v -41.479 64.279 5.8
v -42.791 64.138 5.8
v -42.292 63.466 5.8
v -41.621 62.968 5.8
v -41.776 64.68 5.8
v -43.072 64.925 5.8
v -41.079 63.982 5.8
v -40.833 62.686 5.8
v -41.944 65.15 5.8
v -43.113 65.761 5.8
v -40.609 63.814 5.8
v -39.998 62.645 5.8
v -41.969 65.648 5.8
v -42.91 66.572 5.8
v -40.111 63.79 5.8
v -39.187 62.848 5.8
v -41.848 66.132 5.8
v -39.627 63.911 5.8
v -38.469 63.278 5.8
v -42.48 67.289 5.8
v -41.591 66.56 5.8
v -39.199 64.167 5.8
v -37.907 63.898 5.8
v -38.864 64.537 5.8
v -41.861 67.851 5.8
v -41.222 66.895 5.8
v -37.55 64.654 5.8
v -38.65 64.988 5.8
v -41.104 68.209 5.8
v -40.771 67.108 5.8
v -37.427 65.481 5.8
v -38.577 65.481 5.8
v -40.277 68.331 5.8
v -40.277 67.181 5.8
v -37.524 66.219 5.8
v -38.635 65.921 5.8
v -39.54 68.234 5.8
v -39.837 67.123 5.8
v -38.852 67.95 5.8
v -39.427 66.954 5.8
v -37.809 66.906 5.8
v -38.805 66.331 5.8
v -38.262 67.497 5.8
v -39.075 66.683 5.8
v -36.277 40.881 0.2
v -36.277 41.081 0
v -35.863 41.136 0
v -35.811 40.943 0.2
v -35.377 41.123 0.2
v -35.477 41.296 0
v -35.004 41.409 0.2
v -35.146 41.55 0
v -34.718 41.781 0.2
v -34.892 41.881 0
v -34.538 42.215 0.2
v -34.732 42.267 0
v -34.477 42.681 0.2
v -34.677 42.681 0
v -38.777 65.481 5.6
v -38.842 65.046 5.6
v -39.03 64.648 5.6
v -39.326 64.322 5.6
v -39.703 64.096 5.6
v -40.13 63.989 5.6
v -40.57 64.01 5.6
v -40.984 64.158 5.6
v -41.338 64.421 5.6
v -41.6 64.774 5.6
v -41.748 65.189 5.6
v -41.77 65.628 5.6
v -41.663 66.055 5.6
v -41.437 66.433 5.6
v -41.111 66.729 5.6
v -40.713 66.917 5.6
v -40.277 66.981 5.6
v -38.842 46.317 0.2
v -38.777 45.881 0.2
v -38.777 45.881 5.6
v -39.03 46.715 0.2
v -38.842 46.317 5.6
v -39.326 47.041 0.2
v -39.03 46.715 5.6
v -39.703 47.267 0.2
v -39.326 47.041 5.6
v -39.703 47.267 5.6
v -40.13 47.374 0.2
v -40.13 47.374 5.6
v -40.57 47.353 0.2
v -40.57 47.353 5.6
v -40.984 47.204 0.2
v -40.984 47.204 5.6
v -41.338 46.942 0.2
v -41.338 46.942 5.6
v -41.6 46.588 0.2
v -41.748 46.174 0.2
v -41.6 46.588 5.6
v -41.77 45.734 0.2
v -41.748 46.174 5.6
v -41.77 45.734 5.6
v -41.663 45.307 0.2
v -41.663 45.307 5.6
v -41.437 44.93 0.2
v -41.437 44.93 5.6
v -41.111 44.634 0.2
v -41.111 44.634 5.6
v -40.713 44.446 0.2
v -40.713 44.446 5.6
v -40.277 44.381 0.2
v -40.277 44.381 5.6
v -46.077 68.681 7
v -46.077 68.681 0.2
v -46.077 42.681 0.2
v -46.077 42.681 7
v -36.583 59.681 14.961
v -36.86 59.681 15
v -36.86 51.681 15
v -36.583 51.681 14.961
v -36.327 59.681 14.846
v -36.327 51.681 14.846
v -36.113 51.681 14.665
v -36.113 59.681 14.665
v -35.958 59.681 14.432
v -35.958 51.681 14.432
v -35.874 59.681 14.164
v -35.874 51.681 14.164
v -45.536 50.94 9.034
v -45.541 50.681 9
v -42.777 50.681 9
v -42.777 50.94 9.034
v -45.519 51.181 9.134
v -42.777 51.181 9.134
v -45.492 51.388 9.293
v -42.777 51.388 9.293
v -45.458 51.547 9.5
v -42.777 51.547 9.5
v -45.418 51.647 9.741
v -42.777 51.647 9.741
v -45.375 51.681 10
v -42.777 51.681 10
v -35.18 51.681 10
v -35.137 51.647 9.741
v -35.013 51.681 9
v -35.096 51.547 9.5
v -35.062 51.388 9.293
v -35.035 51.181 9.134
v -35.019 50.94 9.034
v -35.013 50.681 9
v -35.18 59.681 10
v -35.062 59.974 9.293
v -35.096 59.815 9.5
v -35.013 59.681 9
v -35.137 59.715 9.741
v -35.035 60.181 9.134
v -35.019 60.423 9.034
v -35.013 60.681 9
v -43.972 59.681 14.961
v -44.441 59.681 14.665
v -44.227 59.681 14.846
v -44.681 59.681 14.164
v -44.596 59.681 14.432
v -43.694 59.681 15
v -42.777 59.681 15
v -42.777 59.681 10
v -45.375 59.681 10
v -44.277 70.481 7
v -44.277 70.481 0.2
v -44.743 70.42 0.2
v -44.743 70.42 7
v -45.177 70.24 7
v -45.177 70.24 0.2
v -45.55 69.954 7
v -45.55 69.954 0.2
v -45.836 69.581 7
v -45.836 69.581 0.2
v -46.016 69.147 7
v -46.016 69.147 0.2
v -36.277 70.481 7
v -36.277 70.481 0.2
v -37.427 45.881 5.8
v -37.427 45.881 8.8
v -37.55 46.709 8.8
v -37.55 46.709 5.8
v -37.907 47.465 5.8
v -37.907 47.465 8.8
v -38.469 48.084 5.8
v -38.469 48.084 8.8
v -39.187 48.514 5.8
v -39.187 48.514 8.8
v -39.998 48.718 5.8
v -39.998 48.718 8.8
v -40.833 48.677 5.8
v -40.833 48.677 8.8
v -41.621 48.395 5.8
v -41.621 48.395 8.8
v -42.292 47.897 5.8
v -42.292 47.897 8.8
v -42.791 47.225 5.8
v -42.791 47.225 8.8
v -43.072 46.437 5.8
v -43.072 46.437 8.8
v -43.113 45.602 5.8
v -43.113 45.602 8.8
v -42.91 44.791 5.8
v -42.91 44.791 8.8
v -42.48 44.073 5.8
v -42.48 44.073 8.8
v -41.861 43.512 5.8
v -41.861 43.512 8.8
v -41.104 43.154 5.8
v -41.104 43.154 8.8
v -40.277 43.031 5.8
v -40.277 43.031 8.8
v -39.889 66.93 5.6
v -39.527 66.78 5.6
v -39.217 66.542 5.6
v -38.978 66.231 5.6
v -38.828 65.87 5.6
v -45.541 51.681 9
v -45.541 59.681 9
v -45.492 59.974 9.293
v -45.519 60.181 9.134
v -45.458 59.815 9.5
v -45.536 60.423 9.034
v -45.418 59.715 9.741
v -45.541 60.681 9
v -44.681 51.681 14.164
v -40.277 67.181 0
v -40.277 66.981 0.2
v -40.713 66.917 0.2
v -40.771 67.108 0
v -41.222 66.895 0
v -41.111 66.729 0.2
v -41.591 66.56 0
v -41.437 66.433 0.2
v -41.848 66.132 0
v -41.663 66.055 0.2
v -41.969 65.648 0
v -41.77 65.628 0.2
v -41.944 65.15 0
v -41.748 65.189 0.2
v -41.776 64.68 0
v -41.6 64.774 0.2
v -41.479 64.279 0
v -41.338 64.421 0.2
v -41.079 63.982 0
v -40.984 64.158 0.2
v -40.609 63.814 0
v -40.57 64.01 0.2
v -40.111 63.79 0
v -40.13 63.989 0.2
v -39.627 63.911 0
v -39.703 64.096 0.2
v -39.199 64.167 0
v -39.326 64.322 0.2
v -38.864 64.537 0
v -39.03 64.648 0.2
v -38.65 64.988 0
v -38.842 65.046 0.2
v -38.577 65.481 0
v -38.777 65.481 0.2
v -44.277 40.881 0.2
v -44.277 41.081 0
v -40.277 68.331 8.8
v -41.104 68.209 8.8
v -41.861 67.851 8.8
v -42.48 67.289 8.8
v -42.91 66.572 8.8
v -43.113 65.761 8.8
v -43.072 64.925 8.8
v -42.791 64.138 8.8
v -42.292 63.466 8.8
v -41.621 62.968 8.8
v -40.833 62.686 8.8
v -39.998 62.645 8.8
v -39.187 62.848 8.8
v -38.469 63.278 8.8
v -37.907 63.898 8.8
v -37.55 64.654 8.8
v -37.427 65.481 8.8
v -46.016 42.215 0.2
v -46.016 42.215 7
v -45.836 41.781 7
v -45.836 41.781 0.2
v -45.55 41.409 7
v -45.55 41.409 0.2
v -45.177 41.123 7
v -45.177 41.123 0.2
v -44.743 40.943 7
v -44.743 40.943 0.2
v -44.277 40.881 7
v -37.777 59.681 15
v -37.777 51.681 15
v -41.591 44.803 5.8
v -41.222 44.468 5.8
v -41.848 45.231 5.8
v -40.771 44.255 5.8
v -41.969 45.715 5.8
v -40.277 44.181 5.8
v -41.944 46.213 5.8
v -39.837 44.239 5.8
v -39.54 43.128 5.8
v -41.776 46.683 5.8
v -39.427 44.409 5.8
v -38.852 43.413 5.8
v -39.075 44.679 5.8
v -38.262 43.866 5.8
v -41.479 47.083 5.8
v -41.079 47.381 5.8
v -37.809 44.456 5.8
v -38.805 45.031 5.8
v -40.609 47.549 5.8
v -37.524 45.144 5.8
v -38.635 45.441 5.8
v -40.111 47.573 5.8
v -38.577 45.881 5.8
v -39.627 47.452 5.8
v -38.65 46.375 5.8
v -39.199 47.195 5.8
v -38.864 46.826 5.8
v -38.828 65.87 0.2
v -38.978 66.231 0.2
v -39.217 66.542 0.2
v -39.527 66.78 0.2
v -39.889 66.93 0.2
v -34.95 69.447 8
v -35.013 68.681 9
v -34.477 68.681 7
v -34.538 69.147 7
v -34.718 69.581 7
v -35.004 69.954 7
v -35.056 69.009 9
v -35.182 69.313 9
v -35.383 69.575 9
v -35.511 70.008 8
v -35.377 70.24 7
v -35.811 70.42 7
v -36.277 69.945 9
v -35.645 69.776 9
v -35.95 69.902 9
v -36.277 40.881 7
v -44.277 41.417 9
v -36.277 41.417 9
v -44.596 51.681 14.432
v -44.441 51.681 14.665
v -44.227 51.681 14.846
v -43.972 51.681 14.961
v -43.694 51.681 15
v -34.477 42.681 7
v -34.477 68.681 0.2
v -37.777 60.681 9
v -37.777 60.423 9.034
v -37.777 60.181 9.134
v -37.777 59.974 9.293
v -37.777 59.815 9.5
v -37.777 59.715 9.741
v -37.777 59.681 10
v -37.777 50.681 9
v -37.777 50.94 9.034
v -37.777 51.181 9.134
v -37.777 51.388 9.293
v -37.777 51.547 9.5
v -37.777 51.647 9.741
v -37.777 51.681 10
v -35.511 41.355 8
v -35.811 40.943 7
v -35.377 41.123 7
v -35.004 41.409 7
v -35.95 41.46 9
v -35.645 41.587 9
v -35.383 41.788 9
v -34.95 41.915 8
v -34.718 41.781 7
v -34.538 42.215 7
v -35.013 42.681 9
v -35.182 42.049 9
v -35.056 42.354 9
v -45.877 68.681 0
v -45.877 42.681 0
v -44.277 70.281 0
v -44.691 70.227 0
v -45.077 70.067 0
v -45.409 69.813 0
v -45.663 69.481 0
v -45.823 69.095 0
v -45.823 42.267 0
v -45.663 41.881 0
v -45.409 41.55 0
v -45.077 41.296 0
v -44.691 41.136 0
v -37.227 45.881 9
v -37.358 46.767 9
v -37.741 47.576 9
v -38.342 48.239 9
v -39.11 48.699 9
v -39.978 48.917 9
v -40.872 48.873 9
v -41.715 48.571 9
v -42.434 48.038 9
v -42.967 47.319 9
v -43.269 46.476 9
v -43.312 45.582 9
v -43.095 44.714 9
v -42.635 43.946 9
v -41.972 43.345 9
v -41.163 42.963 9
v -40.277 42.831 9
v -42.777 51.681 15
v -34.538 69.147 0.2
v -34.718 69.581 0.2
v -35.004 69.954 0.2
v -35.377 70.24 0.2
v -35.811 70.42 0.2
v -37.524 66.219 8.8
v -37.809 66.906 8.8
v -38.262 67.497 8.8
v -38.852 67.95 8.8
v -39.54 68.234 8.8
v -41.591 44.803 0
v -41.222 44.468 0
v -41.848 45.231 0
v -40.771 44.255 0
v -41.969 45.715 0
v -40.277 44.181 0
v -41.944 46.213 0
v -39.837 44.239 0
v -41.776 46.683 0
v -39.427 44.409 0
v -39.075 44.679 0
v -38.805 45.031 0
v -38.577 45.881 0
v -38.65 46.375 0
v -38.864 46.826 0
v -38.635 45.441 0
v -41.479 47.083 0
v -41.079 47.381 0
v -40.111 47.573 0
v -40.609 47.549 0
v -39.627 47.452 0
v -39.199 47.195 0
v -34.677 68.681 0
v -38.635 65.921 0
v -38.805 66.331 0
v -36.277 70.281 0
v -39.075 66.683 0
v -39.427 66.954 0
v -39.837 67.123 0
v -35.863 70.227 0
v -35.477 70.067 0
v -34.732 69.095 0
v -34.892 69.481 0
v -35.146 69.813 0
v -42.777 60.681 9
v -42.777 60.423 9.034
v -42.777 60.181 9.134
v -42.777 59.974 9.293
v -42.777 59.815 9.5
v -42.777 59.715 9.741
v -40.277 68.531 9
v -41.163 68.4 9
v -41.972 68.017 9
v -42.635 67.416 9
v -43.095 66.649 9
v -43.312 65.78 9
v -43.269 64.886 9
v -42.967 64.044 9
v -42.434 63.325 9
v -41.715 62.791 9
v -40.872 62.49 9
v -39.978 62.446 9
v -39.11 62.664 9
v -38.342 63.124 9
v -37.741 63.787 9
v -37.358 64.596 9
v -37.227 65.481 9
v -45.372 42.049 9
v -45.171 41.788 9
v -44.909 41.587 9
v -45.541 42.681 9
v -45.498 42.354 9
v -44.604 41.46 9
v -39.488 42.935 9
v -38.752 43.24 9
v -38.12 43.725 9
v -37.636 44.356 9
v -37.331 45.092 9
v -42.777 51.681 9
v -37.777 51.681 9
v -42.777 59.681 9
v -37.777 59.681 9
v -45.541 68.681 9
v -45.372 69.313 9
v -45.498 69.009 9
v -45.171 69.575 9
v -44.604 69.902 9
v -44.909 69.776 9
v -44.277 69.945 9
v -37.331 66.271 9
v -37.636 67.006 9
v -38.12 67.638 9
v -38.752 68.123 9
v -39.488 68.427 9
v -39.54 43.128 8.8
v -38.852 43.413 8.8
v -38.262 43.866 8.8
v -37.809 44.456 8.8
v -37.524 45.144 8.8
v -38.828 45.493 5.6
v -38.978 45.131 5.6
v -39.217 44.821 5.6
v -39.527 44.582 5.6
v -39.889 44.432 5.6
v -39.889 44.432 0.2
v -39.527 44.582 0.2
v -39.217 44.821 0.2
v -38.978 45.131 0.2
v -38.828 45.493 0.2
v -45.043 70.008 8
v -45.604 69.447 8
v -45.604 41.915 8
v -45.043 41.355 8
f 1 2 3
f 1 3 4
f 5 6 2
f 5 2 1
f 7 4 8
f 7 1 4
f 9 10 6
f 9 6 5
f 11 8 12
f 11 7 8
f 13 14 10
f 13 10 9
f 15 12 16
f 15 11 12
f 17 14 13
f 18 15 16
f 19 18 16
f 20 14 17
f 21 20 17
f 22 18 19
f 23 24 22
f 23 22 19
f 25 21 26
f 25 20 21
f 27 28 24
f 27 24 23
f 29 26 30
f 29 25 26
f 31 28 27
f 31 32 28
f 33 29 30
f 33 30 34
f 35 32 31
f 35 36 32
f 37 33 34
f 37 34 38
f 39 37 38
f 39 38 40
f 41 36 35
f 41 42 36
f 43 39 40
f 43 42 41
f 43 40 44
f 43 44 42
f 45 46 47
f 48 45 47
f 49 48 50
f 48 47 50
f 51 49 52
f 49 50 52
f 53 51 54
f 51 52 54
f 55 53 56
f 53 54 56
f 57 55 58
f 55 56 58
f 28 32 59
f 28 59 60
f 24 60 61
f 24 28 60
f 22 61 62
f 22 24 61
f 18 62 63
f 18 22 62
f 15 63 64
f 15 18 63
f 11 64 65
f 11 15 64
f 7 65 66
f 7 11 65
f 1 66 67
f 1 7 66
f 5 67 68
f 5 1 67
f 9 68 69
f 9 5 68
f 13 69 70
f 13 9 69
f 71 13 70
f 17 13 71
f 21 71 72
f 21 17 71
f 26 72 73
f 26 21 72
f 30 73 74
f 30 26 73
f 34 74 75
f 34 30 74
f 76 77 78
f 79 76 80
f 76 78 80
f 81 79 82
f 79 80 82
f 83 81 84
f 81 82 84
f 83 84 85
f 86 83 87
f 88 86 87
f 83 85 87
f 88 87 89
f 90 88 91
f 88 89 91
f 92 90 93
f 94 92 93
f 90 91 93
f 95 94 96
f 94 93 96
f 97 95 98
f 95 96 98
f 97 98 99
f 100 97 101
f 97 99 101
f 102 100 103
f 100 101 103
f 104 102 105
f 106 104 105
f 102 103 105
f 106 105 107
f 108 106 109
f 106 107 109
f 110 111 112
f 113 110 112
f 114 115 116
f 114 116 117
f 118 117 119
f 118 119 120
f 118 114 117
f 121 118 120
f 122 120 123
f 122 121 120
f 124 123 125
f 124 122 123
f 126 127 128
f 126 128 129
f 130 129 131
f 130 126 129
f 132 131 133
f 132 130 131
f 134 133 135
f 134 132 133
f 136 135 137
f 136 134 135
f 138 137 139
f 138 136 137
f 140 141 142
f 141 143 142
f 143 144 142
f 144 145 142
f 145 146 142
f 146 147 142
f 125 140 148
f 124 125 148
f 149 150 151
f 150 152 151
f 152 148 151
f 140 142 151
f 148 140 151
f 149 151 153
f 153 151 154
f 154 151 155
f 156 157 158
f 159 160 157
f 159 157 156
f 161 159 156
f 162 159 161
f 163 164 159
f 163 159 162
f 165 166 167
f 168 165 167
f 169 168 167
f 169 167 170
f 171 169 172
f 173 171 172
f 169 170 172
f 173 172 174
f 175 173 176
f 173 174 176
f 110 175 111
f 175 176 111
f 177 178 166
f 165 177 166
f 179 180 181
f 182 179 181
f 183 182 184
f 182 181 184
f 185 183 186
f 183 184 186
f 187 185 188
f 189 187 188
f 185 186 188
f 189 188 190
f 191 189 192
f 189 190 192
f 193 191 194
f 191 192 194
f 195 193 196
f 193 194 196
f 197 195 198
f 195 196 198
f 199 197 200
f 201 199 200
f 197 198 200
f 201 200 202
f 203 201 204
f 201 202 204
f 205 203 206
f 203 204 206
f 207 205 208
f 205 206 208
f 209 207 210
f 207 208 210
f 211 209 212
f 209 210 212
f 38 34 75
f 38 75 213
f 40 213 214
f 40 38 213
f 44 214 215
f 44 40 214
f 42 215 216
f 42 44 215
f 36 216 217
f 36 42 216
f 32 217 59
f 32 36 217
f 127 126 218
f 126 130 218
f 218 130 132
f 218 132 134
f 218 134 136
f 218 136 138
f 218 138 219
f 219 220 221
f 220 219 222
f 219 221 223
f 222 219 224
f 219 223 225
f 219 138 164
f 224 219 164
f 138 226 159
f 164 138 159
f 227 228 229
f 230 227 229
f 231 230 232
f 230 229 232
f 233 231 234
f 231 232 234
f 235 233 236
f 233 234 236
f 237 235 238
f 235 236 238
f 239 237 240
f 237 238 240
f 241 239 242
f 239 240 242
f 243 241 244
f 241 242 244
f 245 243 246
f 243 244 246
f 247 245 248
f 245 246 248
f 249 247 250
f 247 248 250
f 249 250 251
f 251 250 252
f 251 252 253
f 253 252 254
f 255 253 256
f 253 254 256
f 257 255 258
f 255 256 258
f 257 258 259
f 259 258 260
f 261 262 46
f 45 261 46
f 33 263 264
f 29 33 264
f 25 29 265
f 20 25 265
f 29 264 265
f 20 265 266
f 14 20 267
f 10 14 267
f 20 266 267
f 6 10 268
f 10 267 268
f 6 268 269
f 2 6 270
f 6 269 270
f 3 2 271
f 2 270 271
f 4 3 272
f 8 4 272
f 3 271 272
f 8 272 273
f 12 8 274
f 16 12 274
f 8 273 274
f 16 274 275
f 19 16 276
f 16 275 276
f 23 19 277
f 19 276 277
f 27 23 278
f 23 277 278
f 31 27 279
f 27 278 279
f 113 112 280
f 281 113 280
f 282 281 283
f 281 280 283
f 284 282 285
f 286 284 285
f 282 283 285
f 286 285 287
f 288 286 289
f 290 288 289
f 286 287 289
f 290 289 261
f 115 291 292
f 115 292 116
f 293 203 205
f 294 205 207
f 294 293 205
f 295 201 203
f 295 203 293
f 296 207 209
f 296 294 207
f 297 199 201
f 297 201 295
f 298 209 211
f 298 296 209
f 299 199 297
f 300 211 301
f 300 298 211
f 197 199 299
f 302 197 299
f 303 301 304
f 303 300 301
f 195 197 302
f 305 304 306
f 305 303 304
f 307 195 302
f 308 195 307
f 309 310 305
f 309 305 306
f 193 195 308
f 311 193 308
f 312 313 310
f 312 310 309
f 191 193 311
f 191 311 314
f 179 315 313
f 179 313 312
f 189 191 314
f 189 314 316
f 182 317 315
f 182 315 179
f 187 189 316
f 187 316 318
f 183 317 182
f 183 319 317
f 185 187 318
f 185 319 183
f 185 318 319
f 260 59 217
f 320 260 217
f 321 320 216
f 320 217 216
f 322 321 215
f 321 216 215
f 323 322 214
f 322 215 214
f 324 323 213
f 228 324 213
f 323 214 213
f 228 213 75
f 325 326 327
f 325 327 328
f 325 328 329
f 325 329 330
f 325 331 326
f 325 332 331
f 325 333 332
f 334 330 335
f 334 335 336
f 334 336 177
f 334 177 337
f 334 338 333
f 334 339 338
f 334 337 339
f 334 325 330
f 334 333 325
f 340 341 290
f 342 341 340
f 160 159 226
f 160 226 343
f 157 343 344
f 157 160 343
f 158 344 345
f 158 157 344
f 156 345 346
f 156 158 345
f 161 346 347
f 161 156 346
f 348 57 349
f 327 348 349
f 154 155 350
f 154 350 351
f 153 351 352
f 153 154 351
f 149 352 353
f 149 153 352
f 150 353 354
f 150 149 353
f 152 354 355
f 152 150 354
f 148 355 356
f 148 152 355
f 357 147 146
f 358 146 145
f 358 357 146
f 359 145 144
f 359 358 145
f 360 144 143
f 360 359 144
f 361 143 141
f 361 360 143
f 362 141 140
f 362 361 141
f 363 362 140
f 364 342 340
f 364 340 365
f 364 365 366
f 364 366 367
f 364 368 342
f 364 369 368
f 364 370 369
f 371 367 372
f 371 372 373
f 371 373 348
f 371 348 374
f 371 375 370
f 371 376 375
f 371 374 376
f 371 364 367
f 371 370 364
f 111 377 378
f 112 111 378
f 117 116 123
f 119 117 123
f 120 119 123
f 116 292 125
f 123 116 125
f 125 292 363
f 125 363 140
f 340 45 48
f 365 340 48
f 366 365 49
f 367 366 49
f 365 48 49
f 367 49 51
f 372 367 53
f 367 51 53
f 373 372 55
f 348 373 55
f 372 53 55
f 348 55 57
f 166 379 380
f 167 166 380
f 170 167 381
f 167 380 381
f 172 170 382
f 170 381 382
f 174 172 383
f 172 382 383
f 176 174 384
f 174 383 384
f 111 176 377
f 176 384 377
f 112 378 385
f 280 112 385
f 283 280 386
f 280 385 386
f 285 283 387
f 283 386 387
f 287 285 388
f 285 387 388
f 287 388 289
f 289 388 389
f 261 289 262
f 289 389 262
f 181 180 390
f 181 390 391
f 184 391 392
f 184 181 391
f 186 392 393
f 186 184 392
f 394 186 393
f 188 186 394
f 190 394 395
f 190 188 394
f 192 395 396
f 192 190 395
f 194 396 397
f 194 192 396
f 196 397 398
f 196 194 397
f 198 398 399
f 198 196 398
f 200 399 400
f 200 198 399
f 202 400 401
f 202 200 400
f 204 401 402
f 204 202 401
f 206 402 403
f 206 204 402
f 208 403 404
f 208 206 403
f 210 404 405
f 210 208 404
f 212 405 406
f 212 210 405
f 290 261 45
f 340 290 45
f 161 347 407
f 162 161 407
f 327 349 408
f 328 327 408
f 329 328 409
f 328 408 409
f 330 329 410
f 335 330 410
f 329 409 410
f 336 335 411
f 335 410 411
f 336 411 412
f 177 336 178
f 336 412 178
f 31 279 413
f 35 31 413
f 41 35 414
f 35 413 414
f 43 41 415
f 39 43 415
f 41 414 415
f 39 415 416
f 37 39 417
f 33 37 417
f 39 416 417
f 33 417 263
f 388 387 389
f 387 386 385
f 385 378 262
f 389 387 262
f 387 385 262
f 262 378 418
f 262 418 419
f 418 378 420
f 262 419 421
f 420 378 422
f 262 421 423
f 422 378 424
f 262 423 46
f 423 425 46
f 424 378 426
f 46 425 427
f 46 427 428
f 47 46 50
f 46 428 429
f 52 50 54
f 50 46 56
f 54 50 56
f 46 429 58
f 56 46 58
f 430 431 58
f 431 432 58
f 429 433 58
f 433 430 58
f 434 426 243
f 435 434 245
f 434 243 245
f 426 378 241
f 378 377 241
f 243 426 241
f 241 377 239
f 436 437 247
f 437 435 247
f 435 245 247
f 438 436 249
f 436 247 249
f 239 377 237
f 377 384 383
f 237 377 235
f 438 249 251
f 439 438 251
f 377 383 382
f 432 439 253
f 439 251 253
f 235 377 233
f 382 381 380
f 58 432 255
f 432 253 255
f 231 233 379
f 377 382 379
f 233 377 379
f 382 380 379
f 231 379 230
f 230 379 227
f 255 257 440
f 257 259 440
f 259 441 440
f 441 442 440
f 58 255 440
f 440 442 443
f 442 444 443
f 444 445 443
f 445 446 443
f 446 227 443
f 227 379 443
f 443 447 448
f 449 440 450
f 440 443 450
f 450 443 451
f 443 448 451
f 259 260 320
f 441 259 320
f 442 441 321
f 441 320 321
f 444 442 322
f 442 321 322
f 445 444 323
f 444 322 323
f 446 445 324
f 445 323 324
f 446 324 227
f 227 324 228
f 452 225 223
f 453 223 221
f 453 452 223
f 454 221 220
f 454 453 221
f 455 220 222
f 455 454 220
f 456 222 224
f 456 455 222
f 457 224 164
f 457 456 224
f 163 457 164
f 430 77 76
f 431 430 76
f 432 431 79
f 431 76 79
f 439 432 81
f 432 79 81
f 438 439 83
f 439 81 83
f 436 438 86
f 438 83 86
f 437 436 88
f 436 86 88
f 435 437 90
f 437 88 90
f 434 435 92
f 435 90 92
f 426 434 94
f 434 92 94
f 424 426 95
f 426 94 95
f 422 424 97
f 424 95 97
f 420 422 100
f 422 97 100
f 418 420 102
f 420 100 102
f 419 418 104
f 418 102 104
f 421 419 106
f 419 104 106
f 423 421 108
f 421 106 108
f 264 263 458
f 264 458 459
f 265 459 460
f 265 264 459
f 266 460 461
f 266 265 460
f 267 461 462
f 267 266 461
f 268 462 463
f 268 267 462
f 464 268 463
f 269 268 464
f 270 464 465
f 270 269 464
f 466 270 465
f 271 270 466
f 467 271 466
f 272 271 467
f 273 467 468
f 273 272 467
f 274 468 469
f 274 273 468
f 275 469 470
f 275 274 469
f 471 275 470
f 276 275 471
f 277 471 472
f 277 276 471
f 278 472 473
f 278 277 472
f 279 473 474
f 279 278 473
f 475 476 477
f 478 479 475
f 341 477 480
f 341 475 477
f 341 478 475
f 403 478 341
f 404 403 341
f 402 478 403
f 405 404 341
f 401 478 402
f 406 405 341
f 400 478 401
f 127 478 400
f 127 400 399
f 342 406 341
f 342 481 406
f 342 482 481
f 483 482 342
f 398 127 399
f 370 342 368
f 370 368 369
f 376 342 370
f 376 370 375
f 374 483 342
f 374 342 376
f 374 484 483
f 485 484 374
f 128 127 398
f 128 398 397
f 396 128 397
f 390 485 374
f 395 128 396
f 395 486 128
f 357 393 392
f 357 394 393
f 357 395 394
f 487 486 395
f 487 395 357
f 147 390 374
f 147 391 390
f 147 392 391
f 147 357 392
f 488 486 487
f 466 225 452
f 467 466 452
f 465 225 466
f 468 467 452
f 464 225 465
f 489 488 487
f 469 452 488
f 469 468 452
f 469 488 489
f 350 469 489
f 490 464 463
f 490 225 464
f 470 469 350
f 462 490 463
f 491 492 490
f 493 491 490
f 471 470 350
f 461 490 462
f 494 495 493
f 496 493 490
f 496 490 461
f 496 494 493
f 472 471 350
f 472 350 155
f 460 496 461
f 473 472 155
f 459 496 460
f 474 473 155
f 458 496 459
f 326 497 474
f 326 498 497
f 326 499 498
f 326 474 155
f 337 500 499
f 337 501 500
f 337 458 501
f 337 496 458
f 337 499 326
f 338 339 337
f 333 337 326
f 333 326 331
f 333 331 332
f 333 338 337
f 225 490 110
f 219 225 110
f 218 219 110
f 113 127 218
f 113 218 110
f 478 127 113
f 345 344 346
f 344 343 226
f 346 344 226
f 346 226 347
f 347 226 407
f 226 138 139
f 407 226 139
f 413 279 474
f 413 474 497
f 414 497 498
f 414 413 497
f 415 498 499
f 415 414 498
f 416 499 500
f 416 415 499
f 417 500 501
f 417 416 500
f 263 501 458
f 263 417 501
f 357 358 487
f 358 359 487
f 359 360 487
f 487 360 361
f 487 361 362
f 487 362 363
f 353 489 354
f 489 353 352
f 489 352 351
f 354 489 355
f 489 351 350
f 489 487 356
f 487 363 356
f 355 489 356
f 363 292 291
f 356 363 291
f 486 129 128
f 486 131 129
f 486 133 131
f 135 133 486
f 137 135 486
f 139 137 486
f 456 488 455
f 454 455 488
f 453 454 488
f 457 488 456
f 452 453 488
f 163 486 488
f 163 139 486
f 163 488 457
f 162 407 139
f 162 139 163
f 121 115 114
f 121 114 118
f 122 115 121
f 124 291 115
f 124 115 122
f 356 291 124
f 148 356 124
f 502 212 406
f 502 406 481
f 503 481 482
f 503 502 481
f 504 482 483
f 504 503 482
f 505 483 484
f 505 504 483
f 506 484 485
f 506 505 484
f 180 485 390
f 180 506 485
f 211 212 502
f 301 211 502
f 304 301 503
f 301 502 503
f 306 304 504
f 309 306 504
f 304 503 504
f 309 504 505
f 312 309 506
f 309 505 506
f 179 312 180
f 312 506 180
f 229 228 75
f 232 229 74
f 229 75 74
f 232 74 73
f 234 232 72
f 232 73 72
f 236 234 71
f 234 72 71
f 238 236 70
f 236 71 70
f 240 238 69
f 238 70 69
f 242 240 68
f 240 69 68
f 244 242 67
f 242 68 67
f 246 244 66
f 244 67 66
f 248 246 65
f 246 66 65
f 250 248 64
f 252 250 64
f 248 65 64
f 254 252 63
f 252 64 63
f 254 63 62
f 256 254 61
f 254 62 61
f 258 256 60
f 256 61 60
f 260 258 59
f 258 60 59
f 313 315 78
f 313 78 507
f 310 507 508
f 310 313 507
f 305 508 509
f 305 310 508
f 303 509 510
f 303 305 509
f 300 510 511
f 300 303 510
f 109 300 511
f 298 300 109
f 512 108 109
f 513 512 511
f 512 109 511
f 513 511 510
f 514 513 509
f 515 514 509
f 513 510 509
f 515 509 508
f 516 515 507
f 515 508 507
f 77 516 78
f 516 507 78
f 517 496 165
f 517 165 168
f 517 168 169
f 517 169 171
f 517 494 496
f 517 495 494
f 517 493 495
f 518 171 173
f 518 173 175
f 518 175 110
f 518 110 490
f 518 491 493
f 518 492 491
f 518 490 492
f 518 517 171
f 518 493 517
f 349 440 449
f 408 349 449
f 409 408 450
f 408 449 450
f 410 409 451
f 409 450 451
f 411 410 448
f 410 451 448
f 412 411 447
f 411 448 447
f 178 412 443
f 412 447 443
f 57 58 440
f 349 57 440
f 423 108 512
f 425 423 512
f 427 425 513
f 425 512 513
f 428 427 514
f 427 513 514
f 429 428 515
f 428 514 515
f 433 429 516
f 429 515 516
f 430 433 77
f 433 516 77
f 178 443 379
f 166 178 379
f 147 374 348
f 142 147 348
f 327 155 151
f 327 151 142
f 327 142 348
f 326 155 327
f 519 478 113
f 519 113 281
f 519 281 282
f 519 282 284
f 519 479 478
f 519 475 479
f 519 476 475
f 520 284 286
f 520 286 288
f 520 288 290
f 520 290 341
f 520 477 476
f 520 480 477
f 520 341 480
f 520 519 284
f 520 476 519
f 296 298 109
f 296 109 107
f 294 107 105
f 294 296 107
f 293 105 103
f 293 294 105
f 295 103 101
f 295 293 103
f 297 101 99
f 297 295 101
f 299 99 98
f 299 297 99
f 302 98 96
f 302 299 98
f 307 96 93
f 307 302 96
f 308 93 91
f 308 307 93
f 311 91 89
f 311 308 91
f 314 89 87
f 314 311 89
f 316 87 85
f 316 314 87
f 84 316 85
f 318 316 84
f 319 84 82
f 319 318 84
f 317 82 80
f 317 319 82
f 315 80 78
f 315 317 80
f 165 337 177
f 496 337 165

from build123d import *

# Parameters (mm, degrees)
F1_DEPTH      = 9
F3_DEPTH      = 25
F4_DEPTH      = 3.2
F5_SIZE       = 0.2
F6_SIZE2      = 0.5358983849
F6_SIZE       = 2
F7_W          = 2.7641016151
F7_H          = 6
F8_DEPTH      = 6
F9_T4_DEPTH   = 37.1842967295
F9_T9_DEPTH   = 37.1842967295
F10_DEPTH     = 1
F11_DEPTH     = 1
F12_T4_DEPTH  = 5.2641016151
F12_T10_DEPTH = 5.2641016151
F12_T16_DEPTH = 5.2641016151
F12_T22_DEPTH = 5.2641016151
F12_T28_DEPTH = 5.2641016151
F12_T34_DEPTH = 5.2641016151
F12_T40_DEPTH = 5.2641016151
F12_T46_DEPTH = 5.2641016151
F12_T49_DEPTH = 12.2356354419


# Not quite as in the source:
# - a fillet or chamfer that OpenCascade refuses, or shapes differently, is made with other operations: its cross-section is extruded or revolved along the edge and cut away or added


with BuildPart() as f1:
    # F0 (on Top) → F1 (new body)
    with BuildSketch(Plane.XY):
        with BuildLine():
            Line((-34.4771644294, 42.6813552976), (-34.4771644294, 68.6813552976))
            ThreePointArc((-34.4771644294, 68.6813552976), (-35.0043722233, 69.9541475037), (-36.2771644294, 70.4813552976))
            Line((-36.2771644294, 70.4813552976), (-44.2771644294, 70.4813552976))
            ThreePointArc((-44.2771644294, 70.4813552976), (-45.5499566356, 69.9541475037), (-46.0771644294, 68.6813552976))
            Line((-46.0771644294, 68.6813552976), (-46.0771644294, 42.6813552976))
            ThreePointArc((-46.0771644294, 42.6813552976), (-45.5499566356, 41.4085630914), (-44.2771644294, 40.8813552976))
            Line((-44.2771644294, 40.8813552976), (-36.2771644294, 40.8813552976))
            ThreePointArc((-36.2771644294, 40.8813552976), (-35.0043722233, 41.4085630914), (-34.4771644294, 42.6813552976))
        make_face()
    extrude(amount=F1_DEPTH)

    # F2 (on face) → F3 (cut)
    with BuildSketch(Plane.XY.offset(9)):
        with BuildLine():
            ThreePointArc((-38.7771644294, 65.4813552976), (-39.2165042576, 66.5420154693), (-40.2771644294, 66.9813552976))
            ThreePointArc((-40.2771644294, 66.9813552976), (-41.3378246012, 64.4206951258), (-38.7771644294, 65.4813552976))
        make_face()
        with BuildLine():
            ThreePointArc((-38.7771644294, 45.8813552976), (-41.3378246012, 46.9420154693), (-40.2771644294, 44.3813552976))
            ThreePointArc((-40.2771644294, 44.3813552976), (-39.2165042576, 44.8206951258), (-38.7771644294, 45.8813552976))
        make_face()
    extrude(amount=-F3_DEPTH, mode=Mode.SUBTRACT)

    # F2 (on face) → F4 (cut)
    with BuildSketch(Plane.XY.offset(9)):
        with BuildLine():
            ThreePointArc((-37.4271644294, 65.4813552976), (-38.261910103, 67.4966096239), (-40.2771644294, 68.3313552976))
            ThreePointArc((-40.2771644294, 68.3313552976), (-42.2924187558, 63.4661009712), (-37.4271644294, 65.4813552976))
        make_face()
        with BuildLine():
            ThreePointArc((-38.7771644294, 65.4813552976), (-41.3378246012, 64.4206951258), (-40.2771644294, 66.9813552976))
            ThreePointArc((-40.2771644294, 66.9813552976), (-39.2165042576, 66.5420154693), (-38.7771644294, 65.4813552976))
        make_face(mode=Mode.SUBTRACT)
        with BuildLine():
            ThreePointArc((-37.4271644294, 45.8813552976), (-42.2924187558, 47.8966096239), (-40.2771644294, 43.0313552976))
            ThreePointArc((-40.2771644294, 43.0313552976), (-38.261910103, 43.8661009712), (-37.4271644294, 45.8813552976))
        make_face()
        with BuildLine():
            ThreePointArc((-38.7771644294, 45.8813552976), (-39.2165042576, 44.8206951258), (-40.2771644294, 44.3813552976))
            ThreePointArc((-40.2771644294, 44.3813552976), (-41.3378246012, 46.9420154693), (-38.7771644294, 45.8813552976))
        make_face(mode=Mode.SUBTRACT)
    extrude(amount=-F4_DEPTH, mode=Mode.SUBTRACT)

    # F5
    f5_edges = [f1.edges().sort_by_distance(p)[0] for p in [
        (-40.277164, 63.981355, 5.8),
        (-40.277164, 47.381355, 5.8),
        (-34.477164, 55.681355, 0),
        (-35.004372, 41.408563, 0),
        (-35.004372, 69.954148, 0),
        (-40.277164, 40.881355, 0),
        (-40.277164, 70.481355, 0),
        (-45.549957, 41.408563, 0),
        (-45.549957, 69.954148, 0),
        (-46.077164, 55.681355, 0),
        (-40.277164, 47.381355, 0),
        (-40.277164, 63.981355, 0),
        (-40.277164, 62.631355, 9),
        (-40.277164, 48.731355, 9),
    ]]
    chamfer(f5_edges, length=F5_SIZE)

    # F6
    f6_edges = [f1.edges().sort_by_distance(p)[0] for p in [
        (-34.477164, 55.681355, 9),
    ]]
    f6_side = f1.faces().sort_by_distance((-34.477164, 55.681355, 4.6))[0]
    chamfer(f6_edges, length=F6_SIZE, length2=F6_SIZE2, reference=f6_side)

    # F7 (on face) → F8 (join)
    with BuildSketch(Plane.XY.offset(9)):
        with Locations((-36.3951136219, 55.6813552976)):
            Rectangle(F7_W, F7_H)
        with Locations((-44.159215237, 55.6813552976)):
            Rectangle(F7_W, F7_H)
    extrude(amount=F8_DEPTH)

    # F9: chamfer of 1 x 6 on 2 edges, made by hand


with BuildPart() as f9_tool2:
    # F9_s3 → F9_t4 (new body)
    with BuildSketch(Plane.XZ.offset(-37.0892069328)):
        Polygon((-35.0130628143, 9), (-36.0130628143, 15), (-35.0130628143, 15), align=None)
    extrude(amount=-F9_T4_DEPTH)

    split(bisect_by=Plane(origin=(-30.4176323379, 0, -8.1503800206), x_dir=(0, 1, 0), z_dir=(0.9659258263, 0, 0.2588190451)), keep=Keep.TOP)


with BuildPart() as f1_1:
    add(f1.part)

    # F9_t1: cut F9_tool2
    add(f9_tool2.part, mode=Mode.SUBTRACT)


with BuildPart() as f9_tool7:
    # F9_s8 → F9_t9 (new body)
    with BuildSketch(Plane.XZ.offset(-74.2735036623)):
        Polygon((-45.5412660446, 9), (-44.5412660446, 15), (-45.5412660446, 15), align=None)
    extrude(amount=F9_T9_DEPTH)

    split(bisect_by=Plane(origin=(-44.7405796798, 0, 11.9882021941), x_dir=(0, 1, 0), z_dir=(-0.9659258263, 0, 0.2588190451)), keep=Keep.TOP)


with BuildPart() as f1_2:
    add(f1_1.part)

    # F9_t6: cut F9_tool7
    add(f9_tool7.part, mode=Mode.SUBTRACT)

    # F10 (add): faces of the model
    f10_faces = [f1_2.faces().sort_by_distance(p)[0] for p in [
        (-36.6267104431, 58.6813552976, 11.7791618553),
        (-43.9276184157, 58.6813552976, 11.7791618553),
    ]]
    extrude(f10_faces, amount=F10_DEPTH)

    # F11 (add): faces of the model
    f11_faces = [f1_2.faces().sort_by_distance(p)[0] for p in [
        (-43.9276184157, 52.6813552976, 11.7791618553),
        (-36.6267104431, 52.6813552976, 11.7791618553),
    ]]
    extrude(f11_faces, amount=F11_DEPTH)

    # F12: fillet of radius 1 on 6 edges, made by hand


with BuildPart() as f12_tool2:
    # F12_s3 → F12_t4 (new body)
    with BuildSketch(Plane.YZ.offset(-37.7771644294)):
        with BuildLine():
            ThreePointArc((50.6813552976, 9), (51.3884620788, 9.2928932188), (51.6813552976, 10))
            Line((51.6813552976, 10), (51.6813552976, 9))
            Line((51.6813552976, 9), (50.6813552976, 9))
        make_face()
    extrude(amount=F12_T4_DEPTH)

    split(bisect_by=Plane(origin=(-30.4176323379, 0, -8.1503800206), x_dir=(0, 1, 0), z_dir=(-0.9659258263, 0, -0.2588190451)), keep=Keep.TOP)

    split(bisect_by=Plane(origin=(-32.6073043599, 0, -5.4345507266), x_dir=(0, 1, 0), z_dir=(-0.9863939238, 0, -0.1643989873)), keep=Keep.TOP)


with BuildPart() as f1_3:
    add(f1_2.part)

    # F12_t1: union F12_tool2
    add(f12_tool2.part)


with BuildPart() as f12_tool8:
    # F12_s9 → F12_t10 (new body)
    with BuildSketch(Plane.YZ.offset(-37.7771644294)):
        with BuildLine():
            ThreePointArc((50.6813552976, 9), (51.3884620788, 9.2928932188), (51.6813552976, 10))
            Line((51.6813552976, 10), (51.6813552976, 9))
            Line((51.6813552976, 9), (50.6813552976, 9))
        make_face()
    extrude(amount=F12_T10_DEPTH)

    split(bisect_by=Plane(origin=(-30.4176323379, 0, -8.1503800206), x_dir=(0, 1, 0), z_dir=(0.9659258263, 0, 0.2588190451)), keep=Keep.TOP)

    split(bisect_by=Plane(origin=(-32.6073043599, 0, -5.4345507266), x_dir=(0, 1, 0), z_dir=(-0.9863939238, 0, -0.1643989873)), keep=Keep.TOP)


with BuildPart() as f1_4:
    add(f1_3.part)

    # F12_t7: union F12_tool8
    add(f12_tool8.part)


with BuildPart() as f12_tool14:
    # F12_s15 → F12_t16 (new body)
    with BuildSketch(Plane.YZ.offset(-48.0412660446)):
        with BuildLine():
            ThreePointArc((50.6813552976, 9), (51.3884620788, 9.2928932188), (51.6813552976, 10))
            Line((51.6813552976, 10), (51.6813552976, 9))
            Line((51.6813552976, 9), (50.6813552976, 9))
        make_face()
    extrude(amount=F12_T16_DEPTH)

    split(bisect_by=Plane(origin=(-44.7405796798, 0, 11.9882021941), x_dir=(0, 1, 0), z_dir=(-0.9659258263, 0, 0.2588190451)), keep=Keep.TOP)

    split(bisect_by=Plane(origin=(-45.7698804758, 0, 7.6283134126), x_dir=(0, 1, 0), z_dir=(0.9863939238, 0, -0.1643989873)), keep=Keep.TOP)


with BuildPart() as f1_5:
    add(f1_4.part)

    # F12_t13: union F12_tool14
    add(f12_tool14.part)


with BuildPart() as f12_tool20:
    # F12_s21 → F12_t22 (new body)
    with BuildSketch(Plane.YZ.offset(-48.0412660446)):
        with BuildLine():
            ThreePointArc((50.6813552976, 9), (51.3884620788, 9.2928932188), (51.6813552976, 10))
            Line((51.6813552976, 10), (51.6813552976, 9))
            Line((51.6813552976, 9), (50.6813552976, 9))
        make_face()
    extrude(amount=F12_T22_DEPTH)

    split(bisect_by=Plane(origin=(-44.7405796798, 0, 11.9882021941), x_dir=(0, 1, 0), z_dir=(0.9659258263, 0, -0.2588190451)), keep=Keep.TOP)

    split(bisect_by=Plane(origin=(-45.7698804758, 0, 7.6283134126), x_dir=(0, 1, 0), z_dir=(0.9863939238, 0, -0.1643989873)), keep=Keep.TOP)


with BuildPart() as f1_6:
    add(f1_5.part)

    # F12_t19: union F12_tool20
    add(f12_tool20.part)


with BuildPart() as f12_tool26:
    # F12_s27 → F12_t28 (new body)
    with BuildSketch(Plane.YZ.offset(-32.5130628143)):
        with BuildLine():
            ThreePointArc((60.6813552976, 9), (59.9742485164, 9.2928932188), (59.6813552976, 10))
            Line((59.6813552976, 10), (59.6813552976, 9))
            Line((59.6813552976, 9), (60.6813552976, 9))
        make_face()
    extrude(amount=-F12_T28_DEPTH)

    split(bisect_by=Plane(origin=(-30.4176323379, 0, -8.1503800206), x_dir=(0, 1, 0), z_dir=(0.9659258263, 0, 0.2588190451)), keep=Keep.TOP)

    split(bisect_by=Plane(origin=(-32.6073043599, 0, -5.4345507266), x_dir=(0, 1, 0), z_dir=(-0.9863939238, 0, -0.1643989873)), keep=Keep.TOP)


with BuildPart() as f1_7:
    add(f1_6.part)

    # F12_t25: union F12_tool26
    add(f12_tool26.part)


with BuildPart() as f12_tool32:
    # F12_s33 → F12_t34 (new body)
    with BuildSketch(Plane.YZ.offset(-32.5130628143)):
        with BuildLine():
            ThreePointArc((60.6813552976, 9), (59.9742485164, 9.2928932188), (59.6813552976, 10))
            Line((59.6813552976, 10), (59.6813552976, 9))
            Line((59.6813552976, 9), (60.6813552976, 9))
        make_face()
    extrude(amount=-F12_T34_DEPTH)

    split(bisect_by=Plane(origin=(-30.4176323379, 0, -8.1503800206), x_dir=(0, 1, 0), z_dir=(-0.9659258263, 0, -0.2588190451)), keep=Keep.TOP)

    split(bisect_by=Plane(origin=(-32.6073043599, 0, -5.4345507266), x_dir=(0, 1, 0), z_dir=(-0.9863939238, 0, -0.1643989873)), keep=Keep.TOP)


with BuildPart() as f1_8:
    add(f1_7.part)

    # F12_t31: union F12_tool32
    add(f12_tool32.part)


with BuildPart() as f12_tool38:
    # F12_s39 → F12_t40 (new body)
    with BuildSketch(Plane.YZ.offset(-42.7771644294)):
        with BuildLine():
            ThreePointArc((60.6813552976, 9), (59.9742485164, 9.2928932188), (59.6813552976, 10))
            Line((59.6813552976, 10), (59.6813552976, 9))
            Line((59.6813552976, 9), (60.6813552976, 9))
        make_face()
    extrude(amount=-F12_T40_DEPTH)

    split(bisect_by=Plane(origin=(-44.7405796798, 0, 11.9882021941), x_dir=(0, 1, 0), z_dir=(0.9659258263, 0, -0.2588190451)), keep=Keep.TOP)

    split(bisect_by=Plane(origin=(-45.7698804758, 0, 7.6283134126), x_dir=(0, 1, 0), z_dir=(0.9863939238, 0, -0.1643989873)), keep=Keep.TOP)


with BuildPart() as f1_9:
    add(f1_8.part)

    # F12_t37: union F12_tool38
    add(f12_tool38.part)


with BuildPart() as f12_tool44:
    # F12_s45 → F12_t46 (new body)
    with BuildSketch(Plane.YZ.offset(-42.7771644294)):
        with BuildLine():
            ThreePointArc((60.6813552976, 9), (59.9742485164, 9.2928932188), (59.6813552976, 10))
            Line((59.6813552976, 10), (59.6813552976, 9))
            Line((59.6813552976, 9), (60.6813552976, 9))
        make_face()
    extrude(amount=-F12_T46_DEPTH)

    split(bisect_by=Plane(origin=(-44.7405796798, 0, 11.9882021941), x_dir=(0, 1, 0), z_dir=(-0.9659258263, 0, 0.2588190451)), keep=Keep.TOP)

    split(bisect_by=Plane(origin=(-45.7698804758, 0, 7.6283134126), x_dir=(0, 1, 0), z_dir=(0.9863939238, 0, -0.1643989873)), keep=Keep.TOP)


with BuildPart() as f1_10:
    add(f1_9.part)

    # F12_t43: union F12_tool44
    add(f12_tool44.part)

    # F12_s50 → F12_t49 (cut)
    with BuildSketch(Plane.XZ.offset(-61.7991730185)):
        with BuildLine():
            ThreePointArc((-36.8601899027, 15), (-36.2138150066, 14.7630199825), (-35.8737959789, 14.1643989873))
            Line((-35.8737959789, 14.1643989873), (-36.0130628143, 15))
            Line((-36.0130628143, 15), (-36.8601899027, 15))
        make_face()
        with BuildLine():
            ThreePointArc((-44.68053288, 14.1643989873), (-44.3405138523, 14.7630199825), (-43.6941389562, 15))
            Line((-43.6941389562, 15), (-44.5412660446, 15))
            Line((-44.5412660446, 15), (-44.68053288, 14.1643989873))
        make_face()
    extrude(amount=F12_T49_DEPTH, mode=Mode.SUBTRACT)


solid = f1_10.part
